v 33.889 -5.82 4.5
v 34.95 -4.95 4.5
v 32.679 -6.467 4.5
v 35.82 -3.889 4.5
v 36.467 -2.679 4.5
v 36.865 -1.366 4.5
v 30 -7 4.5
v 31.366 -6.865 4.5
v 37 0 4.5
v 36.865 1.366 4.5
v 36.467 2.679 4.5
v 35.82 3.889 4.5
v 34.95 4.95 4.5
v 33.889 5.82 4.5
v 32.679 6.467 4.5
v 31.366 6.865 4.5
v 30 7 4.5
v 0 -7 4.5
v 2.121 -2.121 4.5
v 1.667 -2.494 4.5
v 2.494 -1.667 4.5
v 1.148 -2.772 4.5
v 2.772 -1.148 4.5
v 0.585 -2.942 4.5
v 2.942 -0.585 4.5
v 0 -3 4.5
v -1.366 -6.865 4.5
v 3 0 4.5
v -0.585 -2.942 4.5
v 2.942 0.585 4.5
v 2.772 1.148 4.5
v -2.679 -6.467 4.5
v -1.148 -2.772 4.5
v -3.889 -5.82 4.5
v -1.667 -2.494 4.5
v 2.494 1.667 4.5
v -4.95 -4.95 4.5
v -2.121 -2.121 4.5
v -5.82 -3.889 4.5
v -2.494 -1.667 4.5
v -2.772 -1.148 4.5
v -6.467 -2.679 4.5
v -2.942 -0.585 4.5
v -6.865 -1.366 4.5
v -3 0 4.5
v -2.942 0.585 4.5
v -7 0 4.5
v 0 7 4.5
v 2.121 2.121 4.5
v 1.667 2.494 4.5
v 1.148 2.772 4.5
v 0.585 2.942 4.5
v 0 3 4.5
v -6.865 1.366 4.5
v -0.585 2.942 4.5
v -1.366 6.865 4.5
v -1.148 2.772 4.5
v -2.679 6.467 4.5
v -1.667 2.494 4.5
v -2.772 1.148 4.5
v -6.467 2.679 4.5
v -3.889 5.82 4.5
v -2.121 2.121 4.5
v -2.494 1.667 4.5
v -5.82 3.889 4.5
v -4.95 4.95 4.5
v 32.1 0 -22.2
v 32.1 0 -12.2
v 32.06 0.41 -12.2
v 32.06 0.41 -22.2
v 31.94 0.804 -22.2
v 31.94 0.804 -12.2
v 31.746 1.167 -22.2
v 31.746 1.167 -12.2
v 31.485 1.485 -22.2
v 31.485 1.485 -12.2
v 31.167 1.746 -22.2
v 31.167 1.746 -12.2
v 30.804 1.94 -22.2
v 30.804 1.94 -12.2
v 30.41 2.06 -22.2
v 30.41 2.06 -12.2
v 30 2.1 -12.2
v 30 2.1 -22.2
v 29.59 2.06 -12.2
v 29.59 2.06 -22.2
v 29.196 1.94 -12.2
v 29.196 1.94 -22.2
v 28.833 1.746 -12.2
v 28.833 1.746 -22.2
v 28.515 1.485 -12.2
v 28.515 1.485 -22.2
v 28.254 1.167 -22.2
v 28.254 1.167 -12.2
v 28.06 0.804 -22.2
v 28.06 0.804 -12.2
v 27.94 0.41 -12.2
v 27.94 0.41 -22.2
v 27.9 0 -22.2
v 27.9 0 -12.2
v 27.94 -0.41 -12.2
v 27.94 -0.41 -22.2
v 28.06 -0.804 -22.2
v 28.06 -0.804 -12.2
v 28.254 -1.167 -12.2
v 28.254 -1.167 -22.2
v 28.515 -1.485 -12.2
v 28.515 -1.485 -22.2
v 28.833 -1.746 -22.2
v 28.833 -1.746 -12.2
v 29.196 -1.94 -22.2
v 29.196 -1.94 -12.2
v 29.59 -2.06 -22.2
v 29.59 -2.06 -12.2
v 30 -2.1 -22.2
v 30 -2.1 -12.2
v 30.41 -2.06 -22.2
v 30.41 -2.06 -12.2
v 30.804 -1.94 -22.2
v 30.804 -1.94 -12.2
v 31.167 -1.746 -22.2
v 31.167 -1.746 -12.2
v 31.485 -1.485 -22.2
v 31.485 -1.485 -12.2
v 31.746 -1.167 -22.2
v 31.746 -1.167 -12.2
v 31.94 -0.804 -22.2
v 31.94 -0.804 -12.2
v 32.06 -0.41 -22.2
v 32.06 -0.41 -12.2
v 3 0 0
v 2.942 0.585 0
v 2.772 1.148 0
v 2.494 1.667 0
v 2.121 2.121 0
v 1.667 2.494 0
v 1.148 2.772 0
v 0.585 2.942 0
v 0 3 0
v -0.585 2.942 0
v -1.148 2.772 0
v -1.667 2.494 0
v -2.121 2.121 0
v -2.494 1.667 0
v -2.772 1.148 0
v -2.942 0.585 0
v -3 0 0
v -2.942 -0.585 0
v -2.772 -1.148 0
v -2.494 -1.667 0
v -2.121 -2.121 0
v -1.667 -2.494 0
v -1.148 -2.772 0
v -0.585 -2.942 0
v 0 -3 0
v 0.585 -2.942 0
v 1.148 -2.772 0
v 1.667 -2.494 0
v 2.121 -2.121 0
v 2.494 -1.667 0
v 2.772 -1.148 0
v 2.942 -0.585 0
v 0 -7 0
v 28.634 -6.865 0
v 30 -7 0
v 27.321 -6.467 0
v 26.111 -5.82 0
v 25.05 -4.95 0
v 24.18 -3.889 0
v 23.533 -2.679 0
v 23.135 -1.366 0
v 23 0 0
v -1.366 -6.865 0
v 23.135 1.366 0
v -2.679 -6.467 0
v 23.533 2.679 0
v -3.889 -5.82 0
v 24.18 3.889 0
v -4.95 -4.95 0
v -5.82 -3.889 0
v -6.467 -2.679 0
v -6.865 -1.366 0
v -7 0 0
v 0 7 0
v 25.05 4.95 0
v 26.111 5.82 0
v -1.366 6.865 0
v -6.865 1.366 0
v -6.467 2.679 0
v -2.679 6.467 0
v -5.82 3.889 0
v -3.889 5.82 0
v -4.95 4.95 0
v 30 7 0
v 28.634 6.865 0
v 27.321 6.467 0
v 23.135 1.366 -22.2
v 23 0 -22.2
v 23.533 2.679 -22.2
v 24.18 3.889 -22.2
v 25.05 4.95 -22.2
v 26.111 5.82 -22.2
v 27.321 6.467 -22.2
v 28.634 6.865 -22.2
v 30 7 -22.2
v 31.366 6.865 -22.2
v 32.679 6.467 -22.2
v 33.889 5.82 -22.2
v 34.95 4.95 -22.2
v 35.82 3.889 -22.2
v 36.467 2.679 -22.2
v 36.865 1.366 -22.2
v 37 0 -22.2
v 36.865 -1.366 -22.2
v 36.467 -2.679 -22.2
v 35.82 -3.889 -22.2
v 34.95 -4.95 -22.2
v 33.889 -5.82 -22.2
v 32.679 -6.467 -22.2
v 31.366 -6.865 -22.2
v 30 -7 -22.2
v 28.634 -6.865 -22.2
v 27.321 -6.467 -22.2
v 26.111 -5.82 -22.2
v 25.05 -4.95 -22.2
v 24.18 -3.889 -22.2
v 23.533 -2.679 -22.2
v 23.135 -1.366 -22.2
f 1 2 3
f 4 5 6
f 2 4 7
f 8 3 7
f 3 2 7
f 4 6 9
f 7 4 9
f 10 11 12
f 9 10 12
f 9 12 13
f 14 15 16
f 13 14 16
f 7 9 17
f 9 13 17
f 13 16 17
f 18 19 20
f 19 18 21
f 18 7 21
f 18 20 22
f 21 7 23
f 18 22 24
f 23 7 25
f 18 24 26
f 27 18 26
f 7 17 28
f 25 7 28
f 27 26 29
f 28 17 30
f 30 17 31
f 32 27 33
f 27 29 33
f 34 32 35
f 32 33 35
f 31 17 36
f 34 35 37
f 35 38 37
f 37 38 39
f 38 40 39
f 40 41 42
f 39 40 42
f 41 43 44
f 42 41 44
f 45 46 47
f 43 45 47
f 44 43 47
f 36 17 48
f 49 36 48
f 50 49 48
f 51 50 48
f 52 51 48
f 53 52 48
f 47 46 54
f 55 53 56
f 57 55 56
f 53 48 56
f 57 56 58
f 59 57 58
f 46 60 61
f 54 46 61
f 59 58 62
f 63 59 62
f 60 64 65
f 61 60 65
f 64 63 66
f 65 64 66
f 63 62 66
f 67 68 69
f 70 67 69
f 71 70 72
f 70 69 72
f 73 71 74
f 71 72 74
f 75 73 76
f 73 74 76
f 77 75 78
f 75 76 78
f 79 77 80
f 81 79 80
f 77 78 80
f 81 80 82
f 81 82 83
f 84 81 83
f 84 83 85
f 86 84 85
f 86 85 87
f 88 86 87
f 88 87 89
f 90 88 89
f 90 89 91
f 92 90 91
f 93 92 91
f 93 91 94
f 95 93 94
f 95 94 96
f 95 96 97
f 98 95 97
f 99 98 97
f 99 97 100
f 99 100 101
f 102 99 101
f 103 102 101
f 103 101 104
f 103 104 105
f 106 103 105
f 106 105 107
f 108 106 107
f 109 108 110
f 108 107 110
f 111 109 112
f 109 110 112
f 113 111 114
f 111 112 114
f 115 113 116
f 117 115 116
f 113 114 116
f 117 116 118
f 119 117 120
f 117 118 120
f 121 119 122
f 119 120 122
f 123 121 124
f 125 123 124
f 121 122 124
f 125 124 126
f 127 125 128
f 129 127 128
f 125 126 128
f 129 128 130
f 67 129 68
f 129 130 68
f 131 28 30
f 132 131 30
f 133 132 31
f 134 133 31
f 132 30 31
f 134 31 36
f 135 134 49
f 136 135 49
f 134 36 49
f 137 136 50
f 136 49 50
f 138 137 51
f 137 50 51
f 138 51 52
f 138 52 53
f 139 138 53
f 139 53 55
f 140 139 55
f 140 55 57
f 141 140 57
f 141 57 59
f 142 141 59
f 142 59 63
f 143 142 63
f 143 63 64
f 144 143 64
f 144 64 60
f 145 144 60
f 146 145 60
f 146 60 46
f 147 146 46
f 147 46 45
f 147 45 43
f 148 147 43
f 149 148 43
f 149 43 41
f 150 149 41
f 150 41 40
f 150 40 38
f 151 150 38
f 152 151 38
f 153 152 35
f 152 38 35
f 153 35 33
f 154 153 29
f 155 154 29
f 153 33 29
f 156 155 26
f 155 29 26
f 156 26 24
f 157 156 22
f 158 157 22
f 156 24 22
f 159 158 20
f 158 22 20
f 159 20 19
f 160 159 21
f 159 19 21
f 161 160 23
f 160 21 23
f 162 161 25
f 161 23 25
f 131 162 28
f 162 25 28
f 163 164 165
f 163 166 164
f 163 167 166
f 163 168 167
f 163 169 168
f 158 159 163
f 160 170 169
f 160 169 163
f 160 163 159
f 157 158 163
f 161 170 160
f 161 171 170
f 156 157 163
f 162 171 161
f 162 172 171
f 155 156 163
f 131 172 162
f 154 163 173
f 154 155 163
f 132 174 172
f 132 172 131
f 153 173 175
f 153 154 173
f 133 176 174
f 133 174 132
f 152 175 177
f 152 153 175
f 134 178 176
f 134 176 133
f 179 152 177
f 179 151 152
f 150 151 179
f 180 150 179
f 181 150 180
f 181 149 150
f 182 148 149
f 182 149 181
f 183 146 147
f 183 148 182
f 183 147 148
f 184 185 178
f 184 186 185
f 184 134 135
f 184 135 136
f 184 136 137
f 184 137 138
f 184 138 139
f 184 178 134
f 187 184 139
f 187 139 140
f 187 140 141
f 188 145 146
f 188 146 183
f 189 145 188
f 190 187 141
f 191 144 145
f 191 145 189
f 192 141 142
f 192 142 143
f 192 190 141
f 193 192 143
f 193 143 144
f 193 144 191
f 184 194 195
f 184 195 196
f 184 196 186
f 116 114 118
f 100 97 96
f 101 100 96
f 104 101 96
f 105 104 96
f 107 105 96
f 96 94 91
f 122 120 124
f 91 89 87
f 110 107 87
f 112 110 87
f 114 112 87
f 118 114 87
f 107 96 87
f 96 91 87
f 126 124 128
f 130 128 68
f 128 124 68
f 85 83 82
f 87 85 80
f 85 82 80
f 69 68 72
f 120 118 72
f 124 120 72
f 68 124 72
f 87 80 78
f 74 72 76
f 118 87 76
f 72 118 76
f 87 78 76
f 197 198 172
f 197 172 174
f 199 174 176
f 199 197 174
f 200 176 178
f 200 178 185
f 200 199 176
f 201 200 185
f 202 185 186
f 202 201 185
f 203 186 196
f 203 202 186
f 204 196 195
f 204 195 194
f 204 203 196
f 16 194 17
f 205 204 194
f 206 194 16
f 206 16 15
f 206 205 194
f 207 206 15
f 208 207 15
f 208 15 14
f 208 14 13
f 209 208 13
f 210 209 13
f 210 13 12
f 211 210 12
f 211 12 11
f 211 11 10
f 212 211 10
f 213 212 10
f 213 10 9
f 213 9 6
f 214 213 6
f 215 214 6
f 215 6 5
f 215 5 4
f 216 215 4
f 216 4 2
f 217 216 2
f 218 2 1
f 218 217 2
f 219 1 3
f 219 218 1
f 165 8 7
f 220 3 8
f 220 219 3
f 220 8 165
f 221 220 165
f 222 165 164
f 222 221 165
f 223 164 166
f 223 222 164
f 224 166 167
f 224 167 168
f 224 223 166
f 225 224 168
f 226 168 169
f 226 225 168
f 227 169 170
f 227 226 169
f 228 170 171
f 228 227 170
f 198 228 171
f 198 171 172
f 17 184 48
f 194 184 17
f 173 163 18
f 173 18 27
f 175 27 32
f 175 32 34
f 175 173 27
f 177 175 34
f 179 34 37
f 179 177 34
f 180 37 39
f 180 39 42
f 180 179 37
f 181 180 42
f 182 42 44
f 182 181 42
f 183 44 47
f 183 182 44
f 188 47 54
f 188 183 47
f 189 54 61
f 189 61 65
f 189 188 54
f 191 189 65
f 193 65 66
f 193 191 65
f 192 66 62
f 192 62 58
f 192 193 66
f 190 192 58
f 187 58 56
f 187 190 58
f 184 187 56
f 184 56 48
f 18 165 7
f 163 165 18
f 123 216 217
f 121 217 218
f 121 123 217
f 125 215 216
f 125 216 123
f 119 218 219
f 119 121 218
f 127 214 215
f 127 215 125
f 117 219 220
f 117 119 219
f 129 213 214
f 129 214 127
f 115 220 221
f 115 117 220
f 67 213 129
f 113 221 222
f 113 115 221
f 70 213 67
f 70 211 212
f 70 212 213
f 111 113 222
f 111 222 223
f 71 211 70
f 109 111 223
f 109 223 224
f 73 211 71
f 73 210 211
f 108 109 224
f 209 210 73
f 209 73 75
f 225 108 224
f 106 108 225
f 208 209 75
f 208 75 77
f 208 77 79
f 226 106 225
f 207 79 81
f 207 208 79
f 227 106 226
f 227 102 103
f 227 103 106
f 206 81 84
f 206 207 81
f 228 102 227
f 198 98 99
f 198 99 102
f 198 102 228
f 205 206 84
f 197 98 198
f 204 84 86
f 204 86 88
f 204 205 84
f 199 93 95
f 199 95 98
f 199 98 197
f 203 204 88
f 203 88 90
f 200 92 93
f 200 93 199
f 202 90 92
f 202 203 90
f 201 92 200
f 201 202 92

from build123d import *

# Parameters (mm, degrees)
BOSS_EXTRU_1_DEPTH                  = 4.5
BOSS_EXTRU_2_START                  = 22.2
ESQUISSE2_R                         = 7
BOSS_EXTRU_2_DEPTH                  = 22.2
DIAM_TRE_DU_PER_AGE_4_2_4_2_1_D     = 4.2
DIAM_TRE_DU_PER_AGE_4_2_4_2_1_DEPTH = 10
DIAM_TRE_DU_PER_AGE_6_0_6_1_D       = 6


with BuildPart() as part:
    # Esquisse1 → Boss.-Extru.1 (new body)
    with BuildSketch(Plane(origin=(0, 0, 0), x_dir=(-1, 0, 0), z_dir=(0, 0, -1))):
        with BuildLine():
            Line((0, 7), (-30, 7))
            ThreePointArc((-30, 7), (-37, 0), (-30, -7))
            Line((-30, -7), (0, -7))
            ThreePointArc((0, -7), (7, 0), (0, 7))
        make_face()
    extrude(amount=-BOSS_EXTRU_1_DEPTH)

    # Esquisse2 → Boss.-Extru.2 (add)
    with BuildSketch(Plane(origin=(0, 0, 0), x_dir=(-1, 0, 0), z_dir=(0, 0, -1)).offset(BOSS_EXTRU_2_START)):
        with Locations((-30, 0)):
            Circle(ESQUISSE2_R)
    extrude(amount=-BOSS_EXTRU_2_DEPTH)

    # Diamètre du perçage Ø4.2 (4.2)1
    with Locations(Plane(origin=(0, 0, -22.2), x_dir=(-1, 0, 0), z_dir=(0, 0, -1))):
        with Locations((-30, 0)):
            Hole(DIAM_TRE_DU_PER_AGE_4_2_4_2_1_D / 2, depth=DIAM_TRE_DU_PER_AGE_4_2_4_2_1_DEPTH)

    # Diamètre du perçage Ø6.0 (6)1 (through all)
    with Locations(Plane(origin=(0, 0, 0), x_dir=(-1, 0, 0), z_dir=(0, 0, -1))):
        with Locations((0, 0)):
            Hole(DIAM_TRE_DU_PER_AGE_6_0_6_1_D / 2)


solid = part.part
